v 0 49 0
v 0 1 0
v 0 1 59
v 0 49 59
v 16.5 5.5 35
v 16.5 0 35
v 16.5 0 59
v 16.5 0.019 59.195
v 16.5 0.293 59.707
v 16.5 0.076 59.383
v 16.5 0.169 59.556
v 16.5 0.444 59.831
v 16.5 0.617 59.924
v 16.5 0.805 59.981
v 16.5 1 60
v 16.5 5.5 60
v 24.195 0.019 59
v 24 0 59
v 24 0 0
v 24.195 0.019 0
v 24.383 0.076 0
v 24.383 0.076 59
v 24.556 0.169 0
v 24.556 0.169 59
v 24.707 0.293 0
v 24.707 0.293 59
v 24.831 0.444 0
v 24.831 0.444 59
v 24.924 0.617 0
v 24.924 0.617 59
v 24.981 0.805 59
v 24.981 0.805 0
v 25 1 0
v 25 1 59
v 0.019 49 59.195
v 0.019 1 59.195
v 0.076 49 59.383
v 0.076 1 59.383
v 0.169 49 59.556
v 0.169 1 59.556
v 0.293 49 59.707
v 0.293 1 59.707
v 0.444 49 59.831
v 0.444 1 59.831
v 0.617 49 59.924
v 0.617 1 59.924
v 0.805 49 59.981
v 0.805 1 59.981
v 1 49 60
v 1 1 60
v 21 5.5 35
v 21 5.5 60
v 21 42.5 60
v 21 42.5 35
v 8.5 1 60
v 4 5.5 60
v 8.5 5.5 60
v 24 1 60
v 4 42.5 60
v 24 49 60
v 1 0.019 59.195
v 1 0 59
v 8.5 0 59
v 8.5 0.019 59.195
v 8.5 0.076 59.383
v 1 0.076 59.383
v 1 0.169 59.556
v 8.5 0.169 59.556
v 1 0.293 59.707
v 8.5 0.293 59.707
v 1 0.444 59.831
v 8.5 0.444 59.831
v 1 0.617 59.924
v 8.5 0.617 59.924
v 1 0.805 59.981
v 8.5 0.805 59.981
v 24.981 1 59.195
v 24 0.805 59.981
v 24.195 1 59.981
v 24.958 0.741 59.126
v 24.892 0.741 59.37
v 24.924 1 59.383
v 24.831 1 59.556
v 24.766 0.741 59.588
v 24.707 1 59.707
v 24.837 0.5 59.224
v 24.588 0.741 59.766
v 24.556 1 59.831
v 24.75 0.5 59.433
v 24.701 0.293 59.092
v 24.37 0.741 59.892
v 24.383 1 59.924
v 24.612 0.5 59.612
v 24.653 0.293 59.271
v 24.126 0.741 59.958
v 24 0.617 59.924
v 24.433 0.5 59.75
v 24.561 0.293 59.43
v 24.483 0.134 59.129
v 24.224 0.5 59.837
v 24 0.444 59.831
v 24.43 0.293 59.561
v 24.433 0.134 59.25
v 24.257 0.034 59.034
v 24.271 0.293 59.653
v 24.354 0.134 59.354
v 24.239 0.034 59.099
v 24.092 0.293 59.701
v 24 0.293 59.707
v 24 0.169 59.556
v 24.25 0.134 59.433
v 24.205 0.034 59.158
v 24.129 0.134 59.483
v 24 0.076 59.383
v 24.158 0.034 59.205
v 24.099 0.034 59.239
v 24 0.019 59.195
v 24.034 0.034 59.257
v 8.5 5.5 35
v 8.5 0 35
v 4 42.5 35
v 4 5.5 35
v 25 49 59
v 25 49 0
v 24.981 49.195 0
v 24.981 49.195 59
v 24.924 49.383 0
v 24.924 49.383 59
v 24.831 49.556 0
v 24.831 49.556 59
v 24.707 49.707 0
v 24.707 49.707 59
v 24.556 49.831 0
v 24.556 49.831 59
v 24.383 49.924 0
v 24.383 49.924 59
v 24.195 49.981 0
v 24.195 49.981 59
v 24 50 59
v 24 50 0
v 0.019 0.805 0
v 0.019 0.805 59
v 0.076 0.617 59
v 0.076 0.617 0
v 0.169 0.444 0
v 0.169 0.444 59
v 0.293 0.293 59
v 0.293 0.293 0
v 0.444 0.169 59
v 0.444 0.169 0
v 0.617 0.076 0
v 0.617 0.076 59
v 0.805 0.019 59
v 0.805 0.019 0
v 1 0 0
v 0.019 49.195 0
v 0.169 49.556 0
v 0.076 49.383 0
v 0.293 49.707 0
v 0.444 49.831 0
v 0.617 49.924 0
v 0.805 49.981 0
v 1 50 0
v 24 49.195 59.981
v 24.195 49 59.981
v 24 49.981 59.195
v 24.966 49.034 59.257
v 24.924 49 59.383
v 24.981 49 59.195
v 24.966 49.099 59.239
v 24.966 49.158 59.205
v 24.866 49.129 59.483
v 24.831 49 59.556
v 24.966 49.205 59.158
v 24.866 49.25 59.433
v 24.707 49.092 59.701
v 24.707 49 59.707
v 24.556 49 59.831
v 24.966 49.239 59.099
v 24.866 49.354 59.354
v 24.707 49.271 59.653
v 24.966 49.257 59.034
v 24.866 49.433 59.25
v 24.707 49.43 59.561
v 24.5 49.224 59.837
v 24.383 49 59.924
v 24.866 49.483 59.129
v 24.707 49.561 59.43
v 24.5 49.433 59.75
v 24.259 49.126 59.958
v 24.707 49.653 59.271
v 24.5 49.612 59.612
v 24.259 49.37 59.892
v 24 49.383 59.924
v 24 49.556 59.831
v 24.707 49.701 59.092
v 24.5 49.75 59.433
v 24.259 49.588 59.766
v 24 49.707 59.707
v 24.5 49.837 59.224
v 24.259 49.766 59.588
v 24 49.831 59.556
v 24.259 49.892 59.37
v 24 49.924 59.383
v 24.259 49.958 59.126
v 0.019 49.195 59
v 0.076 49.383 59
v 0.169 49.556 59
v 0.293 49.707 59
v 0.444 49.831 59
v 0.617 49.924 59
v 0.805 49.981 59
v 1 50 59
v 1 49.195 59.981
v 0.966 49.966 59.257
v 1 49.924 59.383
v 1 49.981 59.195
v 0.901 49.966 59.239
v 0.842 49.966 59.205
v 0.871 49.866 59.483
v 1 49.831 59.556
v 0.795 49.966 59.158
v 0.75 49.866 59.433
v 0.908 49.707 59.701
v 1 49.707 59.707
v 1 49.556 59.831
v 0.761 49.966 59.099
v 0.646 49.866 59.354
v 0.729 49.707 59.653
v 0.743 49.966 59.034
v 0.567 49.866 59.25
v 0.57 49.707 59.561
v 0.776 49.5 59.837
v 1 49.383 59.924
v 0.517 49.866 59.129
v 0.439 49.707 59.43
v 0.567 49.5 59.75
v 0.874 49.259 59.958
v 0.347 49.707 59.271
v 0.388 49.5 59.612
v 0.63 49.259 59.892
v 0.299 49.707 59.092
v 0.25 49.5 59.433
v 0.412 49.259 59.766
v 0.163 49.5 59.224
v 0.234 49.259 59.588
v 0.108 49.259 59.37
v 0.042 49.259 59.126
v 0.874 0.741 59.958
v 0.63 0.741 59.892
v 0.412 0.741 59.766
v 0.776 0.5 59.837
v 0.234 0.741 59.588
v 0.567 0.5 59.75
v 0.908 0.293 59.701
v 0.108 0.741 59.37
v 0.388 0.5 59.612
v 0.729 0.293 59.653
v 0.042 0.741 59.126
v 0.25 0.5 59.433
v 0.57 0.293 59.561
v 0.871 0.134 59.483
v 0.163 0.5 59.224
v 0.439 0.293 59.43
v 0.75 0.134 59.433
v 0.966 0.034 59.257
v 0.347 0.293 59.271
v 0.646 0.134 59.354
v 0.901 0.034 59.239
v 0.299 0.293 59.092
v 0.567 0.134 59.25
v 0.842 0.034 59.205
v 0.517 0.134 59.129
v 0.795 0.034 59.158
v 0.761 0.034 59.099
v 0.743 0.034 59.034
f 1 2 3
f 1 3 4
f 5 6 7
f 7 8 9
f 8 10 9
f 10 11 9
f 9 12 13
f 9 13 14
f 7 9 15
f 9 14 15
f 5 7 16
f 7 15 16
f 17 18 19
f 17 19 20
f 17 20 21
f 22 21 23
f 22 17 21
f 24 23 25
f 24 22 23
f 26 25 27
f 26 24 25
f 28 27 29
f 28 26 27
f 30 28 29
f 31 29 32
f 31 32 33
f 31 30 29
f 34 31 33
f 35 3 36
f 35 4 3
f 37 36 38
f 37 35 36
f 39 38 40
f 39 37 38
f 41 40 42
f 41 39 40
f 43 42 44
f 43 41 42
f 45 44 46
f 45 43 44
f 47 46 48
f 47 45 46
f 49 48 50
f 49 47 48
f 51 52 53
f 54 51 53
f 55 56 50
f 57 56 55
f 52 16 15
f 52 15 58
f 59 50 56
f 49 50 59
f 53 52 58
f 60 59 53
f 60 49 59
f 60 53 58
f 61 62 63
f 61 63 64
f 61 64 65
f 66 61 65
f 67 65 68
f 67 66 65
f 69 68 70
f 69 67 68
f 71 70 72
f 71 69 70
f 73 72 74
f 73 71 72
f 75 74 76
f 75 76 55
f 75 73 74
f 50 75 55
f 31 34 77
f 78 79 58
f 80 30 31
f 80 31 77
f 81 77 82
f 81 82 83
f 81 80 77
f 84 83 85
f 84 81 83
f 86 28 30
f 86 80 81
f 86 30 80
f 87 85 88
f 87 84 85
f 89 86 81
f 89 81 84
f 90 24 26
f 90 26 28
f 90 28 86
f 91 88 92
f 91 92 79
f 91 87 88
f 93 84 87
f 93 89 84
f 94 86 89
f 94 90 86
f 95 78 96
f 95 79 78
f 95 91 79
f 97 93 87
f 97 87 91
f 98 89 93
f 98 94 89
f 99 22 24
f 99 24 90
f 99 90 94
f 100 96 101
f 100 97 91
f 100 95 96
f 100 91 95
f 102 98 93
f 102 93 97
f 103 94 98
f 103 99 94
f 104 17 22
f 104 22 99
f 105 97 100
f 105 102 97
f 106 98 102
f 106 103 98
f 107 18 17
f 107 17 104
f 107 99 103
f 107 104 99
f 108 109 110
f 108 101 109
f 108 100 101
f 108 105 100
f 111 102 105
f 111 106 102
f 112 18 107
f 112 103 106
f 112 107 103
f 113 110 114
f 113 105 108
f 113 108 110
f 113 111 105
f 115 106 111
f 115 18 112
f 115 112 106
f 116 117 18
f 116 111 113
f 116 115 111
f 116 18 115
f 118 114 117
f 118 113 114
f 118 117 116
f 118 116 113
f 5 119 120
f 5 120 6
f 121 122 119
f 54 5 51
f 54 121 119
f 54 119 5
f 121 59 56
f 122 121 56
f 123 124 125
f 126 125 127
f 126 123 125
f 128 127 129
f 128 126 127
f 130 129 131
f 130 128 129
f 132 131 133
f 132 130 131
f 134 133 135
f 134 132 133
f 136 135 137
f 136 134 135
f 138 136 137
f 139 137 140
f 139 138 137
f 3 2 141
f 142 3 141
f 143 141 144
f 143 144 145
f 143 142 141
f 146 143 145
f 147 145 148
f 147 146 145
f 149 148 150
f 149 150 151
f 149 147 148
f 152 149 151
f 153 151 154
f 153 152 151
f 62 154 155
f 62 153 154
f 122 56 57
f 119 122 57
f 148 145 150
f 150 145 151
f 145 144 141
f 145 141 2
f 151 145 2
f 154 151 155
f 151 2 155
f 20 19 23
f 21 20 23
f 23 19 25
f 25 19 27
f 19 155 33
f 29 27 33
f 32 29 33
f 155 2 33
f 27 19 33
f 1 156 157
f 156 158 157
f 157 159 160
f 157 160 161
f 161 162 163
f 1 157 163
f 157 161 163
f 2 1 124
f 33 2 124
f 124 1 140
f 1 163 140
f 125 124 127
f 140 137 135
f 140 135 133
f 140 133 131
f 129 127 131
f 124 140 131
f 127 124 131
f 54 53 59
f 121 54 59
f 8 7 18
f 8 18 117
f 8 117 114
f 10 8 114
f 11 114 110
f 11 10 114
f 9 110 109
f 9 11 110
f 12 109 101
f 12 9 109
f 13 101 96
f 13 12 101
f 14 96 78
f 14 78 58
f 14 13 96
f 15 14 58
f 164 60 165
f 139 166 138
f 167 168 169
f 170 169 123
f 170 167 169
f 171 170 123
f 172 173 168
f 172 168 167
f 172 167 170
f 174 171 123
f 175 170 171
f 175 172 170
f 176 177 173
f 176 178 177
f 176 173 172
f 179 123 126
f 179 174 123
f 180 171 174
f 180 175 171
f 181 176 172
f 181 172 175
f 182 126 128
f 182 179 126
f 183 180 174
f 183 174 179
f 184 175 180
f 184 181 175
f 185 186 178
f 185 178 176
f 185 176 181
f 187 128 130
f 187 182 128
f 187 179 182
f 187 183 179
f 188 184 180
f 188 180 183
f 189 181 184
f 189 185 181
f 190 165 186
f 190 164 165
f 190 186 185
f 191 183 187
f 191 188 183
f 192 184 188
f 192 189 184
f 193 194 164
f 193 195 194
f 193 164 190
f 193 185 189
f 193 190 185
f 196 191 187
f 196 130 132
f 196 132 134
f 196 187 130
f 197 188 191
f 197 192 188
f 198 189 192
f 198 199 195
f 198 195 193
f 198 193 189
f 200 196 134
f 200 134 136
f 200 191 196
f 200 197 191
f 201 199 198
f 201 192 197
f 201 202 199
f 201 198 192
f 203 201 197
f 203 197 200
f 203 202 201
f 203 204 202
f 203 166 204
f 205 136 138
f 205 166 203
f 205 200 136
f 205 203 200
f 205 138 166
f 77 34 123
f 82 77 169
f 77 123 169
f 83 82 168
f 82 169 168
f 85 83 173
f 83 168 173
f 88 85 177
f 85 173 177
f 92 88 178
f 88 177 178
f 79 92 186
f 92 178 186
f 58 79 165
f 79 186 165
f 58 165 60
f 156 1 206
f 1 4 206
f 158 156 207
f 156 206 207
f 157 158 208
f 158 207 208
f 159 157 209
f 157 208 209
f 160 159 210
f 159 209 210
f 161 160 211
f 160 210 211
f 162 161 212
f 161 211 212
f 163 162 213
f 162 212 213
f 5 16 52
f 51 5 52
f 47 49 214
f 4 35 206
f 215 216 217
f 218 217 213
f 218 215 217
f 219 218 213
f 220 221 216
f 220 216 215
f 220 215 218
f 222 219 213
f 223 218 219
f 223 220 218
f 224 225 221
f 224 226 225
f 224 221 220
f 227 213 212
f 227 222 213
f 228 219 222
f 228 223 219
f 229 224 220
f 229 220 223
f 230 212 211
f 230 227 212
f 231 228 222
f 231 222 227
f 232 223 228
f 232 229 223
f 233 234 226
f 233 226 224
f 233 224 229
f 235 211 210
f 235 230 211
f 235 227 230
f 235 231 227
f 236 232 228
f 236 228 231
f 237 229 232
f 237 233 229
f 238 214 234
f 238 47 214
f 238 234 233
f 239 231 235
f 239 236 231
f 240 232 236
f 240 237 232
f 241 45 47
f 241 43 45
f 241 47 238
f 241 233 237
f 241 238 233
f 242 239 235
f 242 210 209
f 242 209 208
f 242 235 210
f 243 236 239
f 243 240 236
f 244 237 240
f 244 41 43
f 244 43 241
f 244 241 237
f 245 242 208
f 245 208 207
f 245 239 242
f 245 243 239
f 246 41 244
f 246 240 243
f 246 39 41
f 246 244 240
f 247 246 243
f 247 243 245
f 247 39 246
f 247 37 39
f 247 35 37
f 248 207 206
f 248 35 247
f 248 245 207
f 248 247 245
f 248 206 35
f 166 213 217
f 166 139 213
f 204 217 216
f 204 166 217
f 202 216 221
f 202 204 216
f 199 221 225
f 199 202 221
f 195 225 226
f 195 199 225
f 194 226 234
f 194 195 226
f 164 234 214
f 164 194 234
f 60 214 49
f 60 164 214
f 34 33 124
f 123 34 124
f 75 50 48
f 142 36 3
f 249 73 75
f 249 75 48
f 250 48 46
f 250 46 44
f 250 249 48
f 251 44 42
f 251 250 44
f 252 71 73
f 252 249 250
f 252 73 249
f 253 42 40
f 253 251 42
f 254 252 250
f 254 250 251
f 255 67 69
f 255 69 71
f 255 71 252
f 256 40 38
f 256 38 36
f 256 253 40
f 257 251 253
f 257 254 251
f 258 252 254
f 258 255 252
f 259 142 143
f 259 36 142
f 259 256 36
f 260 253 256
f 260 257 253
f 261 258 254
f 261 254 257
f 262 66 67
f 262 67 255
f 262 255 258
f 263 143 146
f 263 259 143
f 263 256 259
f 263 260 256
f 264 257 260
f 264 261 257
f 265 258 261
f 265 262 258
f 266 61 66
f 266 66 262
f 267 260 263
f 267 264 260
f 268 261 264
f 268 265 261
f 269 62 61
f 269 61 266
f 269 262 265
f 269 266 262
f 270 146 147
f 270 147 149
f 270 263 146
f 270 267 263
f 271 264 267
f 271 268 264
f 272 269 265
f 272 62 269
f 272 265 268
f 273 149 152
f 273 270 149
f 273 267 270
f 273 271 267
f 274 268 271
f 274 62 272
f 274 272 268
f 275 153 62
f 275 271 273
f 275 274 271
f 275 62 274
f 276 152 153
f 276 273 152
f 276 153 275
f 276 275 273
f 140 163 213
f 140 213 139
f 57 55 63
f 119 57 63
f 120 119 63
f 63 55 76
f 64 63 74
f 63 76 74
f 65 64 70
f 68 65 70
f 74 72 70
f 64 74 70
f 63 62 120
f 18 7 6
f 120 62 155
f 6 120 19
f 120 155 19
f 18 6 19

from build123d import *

# Parameters (mm, degrees)
F0_W         = 25
F0_H         = 50
F1_DEPTH     = 60
F2_R         = 1
F4_DEPTH     = 25
F5_T1_DEPTH  = 10
F5_T3_DEPTH  = 10
F5_S7_W      = 1
F5_S7_H      = 1
F5_T8_DEPTH  = 1
F5_S13_W     = 1
F5_S13_H     = 1
F5_T14_DEPTH = 1


# Not quite as in the source:
# - a fillet or chamfer that OpenCascade refuses, or shapes differently, is made with other operations: its cross-section is extruded or revolved along the edge and cut away or added


with BuildPart() as f1:
    # F0 (on Top) → F1 (new body)
    with BuildSketch(Plane.XY):
        with Locations((12.5, 25)):
            Rectangle(F0_W, F0_H)
    extrude(amount=F1_DEPTH)

    # F2
    f2_edges = [f1.edges().sort_by_distance(p)[0] for p in [
        (0, 25, 60),
        (12.5, 50, 60),
        (25, 25, 60),
        (25, 0, 30),
        (0, 0, 30),
        (0, 50, 30),
        (25, 50, 30),
    ]]
    fillet(f2_edges, radius=F2_R)

    # F3 (on face) → F4 (cut)
    with BuildSketch(Plane.XY.offset(60)):
        Polygon((21, 42.5), (4, 42.5), (4, 5.5), (8.5, 5.5), (8.5, 0), (16.5, 0), (16.5, 5.5), (21, 5.5), align=None)
    extrude(amount=-F4_DEPTH, mode=Mode.SUBTRACT)

    # F5: fillet of radius 1 on 2 edges, made by hand

    # F5_s2 → F5_t1 (cut)
    with BuildSketch(Plane.YZ.offset(1)):
        with BuildLine():
            ThreePointArc((0, 59), (0.2928932188, 59.7071067812), (1, 60))
            Line((1, 60), (0, 60))
            Line((0, 60), (0, 59))
        make_face()
    extrude(amount=F5_T1_DEPTH, mode=Mode.SUBTRACT)

    # F5_s4 → F5_t3 (cut)
    with BuildSketch(Plane.YZ.offset(14)):
        with BuildLine():
            ThreePointArc((0, 59), (0.2928932188, 59.7071067812), (1, 60))
            Line((1, 60), (0, 60))
            Line((0, 60), (0, 59))
        make_face()
    extrude(amount=F5_T3_DEPTH, mode=Mode.SUBTRACT)


with BuildPart() as f5_tool6:
    # F5_s7 → F5_t8 (new body)
    with BuildSketch(Plane.XZ.offset(-1)):
        with Locations((24.5, 59.5)):
            Rectangle(F5_S7_W, F5_S7_H)
    extrude(amount=F5_T8_DEPTH)

    # F5_s9 → F5_t10 (revolve, cut)
    with BuildSketch(Plane(origin=(24, 1, 59), x_dir=(-0.7071067812, 0, -0.7071067812), z_dir=(-0.7071067812, 0, 0.7071067812))):
        with BuildLine():
            ThreePointArc((0, -1), (1, 0), (0, 1))
            Line((0, 1), (0, -1))
        make_face()
    revolve(axis=Axis((24, 1, 59), (0, -1, 0)), mode=Mode.SUBTRACT)


with BuildPart() as f1_1:
    add(f1.part)

    # F5_t5: cut F5_tool6
    add(f5_tool6.part, mode=Mode.SUBTRACT)


with BuildPart() as f5_tool12:
    # F5_s13 → F5_t14 (new body)
    with BuildSketch(Plane.XZ.offset(-1)):
        with Locations((0.5, 59.5)):
            Rectangle(F5_S13_W, F5_S13_H)
    extrude(amount=F5_T14_DEPTH)

    # F5_s15 → F5_t16 (revolve, cut)
    with BuildSketch(Plane(origin=(1, 1, 59), x_dir=(0.7071067812, 0, -0.7071067812), z_dir=(-0.7071067812, 0, -0.7071067812))):
        with BuildLine():
            ThreePointArc((0, -1), (1, 0), (0, 1))
            Line((0, 1), (0, -1))
        make_face()
    revolve(axis=Axis((1, 1, 59), (0, -1, 0)), mode=Mode.SUBTRACT)


with BuildPart() as f1_2:
    add(f1_1.part)

    # F5_t11: cut F5_tool12
    add(f5_tool12.part, mode=Mode.SUBTRACT)


solid = f1_2.part
